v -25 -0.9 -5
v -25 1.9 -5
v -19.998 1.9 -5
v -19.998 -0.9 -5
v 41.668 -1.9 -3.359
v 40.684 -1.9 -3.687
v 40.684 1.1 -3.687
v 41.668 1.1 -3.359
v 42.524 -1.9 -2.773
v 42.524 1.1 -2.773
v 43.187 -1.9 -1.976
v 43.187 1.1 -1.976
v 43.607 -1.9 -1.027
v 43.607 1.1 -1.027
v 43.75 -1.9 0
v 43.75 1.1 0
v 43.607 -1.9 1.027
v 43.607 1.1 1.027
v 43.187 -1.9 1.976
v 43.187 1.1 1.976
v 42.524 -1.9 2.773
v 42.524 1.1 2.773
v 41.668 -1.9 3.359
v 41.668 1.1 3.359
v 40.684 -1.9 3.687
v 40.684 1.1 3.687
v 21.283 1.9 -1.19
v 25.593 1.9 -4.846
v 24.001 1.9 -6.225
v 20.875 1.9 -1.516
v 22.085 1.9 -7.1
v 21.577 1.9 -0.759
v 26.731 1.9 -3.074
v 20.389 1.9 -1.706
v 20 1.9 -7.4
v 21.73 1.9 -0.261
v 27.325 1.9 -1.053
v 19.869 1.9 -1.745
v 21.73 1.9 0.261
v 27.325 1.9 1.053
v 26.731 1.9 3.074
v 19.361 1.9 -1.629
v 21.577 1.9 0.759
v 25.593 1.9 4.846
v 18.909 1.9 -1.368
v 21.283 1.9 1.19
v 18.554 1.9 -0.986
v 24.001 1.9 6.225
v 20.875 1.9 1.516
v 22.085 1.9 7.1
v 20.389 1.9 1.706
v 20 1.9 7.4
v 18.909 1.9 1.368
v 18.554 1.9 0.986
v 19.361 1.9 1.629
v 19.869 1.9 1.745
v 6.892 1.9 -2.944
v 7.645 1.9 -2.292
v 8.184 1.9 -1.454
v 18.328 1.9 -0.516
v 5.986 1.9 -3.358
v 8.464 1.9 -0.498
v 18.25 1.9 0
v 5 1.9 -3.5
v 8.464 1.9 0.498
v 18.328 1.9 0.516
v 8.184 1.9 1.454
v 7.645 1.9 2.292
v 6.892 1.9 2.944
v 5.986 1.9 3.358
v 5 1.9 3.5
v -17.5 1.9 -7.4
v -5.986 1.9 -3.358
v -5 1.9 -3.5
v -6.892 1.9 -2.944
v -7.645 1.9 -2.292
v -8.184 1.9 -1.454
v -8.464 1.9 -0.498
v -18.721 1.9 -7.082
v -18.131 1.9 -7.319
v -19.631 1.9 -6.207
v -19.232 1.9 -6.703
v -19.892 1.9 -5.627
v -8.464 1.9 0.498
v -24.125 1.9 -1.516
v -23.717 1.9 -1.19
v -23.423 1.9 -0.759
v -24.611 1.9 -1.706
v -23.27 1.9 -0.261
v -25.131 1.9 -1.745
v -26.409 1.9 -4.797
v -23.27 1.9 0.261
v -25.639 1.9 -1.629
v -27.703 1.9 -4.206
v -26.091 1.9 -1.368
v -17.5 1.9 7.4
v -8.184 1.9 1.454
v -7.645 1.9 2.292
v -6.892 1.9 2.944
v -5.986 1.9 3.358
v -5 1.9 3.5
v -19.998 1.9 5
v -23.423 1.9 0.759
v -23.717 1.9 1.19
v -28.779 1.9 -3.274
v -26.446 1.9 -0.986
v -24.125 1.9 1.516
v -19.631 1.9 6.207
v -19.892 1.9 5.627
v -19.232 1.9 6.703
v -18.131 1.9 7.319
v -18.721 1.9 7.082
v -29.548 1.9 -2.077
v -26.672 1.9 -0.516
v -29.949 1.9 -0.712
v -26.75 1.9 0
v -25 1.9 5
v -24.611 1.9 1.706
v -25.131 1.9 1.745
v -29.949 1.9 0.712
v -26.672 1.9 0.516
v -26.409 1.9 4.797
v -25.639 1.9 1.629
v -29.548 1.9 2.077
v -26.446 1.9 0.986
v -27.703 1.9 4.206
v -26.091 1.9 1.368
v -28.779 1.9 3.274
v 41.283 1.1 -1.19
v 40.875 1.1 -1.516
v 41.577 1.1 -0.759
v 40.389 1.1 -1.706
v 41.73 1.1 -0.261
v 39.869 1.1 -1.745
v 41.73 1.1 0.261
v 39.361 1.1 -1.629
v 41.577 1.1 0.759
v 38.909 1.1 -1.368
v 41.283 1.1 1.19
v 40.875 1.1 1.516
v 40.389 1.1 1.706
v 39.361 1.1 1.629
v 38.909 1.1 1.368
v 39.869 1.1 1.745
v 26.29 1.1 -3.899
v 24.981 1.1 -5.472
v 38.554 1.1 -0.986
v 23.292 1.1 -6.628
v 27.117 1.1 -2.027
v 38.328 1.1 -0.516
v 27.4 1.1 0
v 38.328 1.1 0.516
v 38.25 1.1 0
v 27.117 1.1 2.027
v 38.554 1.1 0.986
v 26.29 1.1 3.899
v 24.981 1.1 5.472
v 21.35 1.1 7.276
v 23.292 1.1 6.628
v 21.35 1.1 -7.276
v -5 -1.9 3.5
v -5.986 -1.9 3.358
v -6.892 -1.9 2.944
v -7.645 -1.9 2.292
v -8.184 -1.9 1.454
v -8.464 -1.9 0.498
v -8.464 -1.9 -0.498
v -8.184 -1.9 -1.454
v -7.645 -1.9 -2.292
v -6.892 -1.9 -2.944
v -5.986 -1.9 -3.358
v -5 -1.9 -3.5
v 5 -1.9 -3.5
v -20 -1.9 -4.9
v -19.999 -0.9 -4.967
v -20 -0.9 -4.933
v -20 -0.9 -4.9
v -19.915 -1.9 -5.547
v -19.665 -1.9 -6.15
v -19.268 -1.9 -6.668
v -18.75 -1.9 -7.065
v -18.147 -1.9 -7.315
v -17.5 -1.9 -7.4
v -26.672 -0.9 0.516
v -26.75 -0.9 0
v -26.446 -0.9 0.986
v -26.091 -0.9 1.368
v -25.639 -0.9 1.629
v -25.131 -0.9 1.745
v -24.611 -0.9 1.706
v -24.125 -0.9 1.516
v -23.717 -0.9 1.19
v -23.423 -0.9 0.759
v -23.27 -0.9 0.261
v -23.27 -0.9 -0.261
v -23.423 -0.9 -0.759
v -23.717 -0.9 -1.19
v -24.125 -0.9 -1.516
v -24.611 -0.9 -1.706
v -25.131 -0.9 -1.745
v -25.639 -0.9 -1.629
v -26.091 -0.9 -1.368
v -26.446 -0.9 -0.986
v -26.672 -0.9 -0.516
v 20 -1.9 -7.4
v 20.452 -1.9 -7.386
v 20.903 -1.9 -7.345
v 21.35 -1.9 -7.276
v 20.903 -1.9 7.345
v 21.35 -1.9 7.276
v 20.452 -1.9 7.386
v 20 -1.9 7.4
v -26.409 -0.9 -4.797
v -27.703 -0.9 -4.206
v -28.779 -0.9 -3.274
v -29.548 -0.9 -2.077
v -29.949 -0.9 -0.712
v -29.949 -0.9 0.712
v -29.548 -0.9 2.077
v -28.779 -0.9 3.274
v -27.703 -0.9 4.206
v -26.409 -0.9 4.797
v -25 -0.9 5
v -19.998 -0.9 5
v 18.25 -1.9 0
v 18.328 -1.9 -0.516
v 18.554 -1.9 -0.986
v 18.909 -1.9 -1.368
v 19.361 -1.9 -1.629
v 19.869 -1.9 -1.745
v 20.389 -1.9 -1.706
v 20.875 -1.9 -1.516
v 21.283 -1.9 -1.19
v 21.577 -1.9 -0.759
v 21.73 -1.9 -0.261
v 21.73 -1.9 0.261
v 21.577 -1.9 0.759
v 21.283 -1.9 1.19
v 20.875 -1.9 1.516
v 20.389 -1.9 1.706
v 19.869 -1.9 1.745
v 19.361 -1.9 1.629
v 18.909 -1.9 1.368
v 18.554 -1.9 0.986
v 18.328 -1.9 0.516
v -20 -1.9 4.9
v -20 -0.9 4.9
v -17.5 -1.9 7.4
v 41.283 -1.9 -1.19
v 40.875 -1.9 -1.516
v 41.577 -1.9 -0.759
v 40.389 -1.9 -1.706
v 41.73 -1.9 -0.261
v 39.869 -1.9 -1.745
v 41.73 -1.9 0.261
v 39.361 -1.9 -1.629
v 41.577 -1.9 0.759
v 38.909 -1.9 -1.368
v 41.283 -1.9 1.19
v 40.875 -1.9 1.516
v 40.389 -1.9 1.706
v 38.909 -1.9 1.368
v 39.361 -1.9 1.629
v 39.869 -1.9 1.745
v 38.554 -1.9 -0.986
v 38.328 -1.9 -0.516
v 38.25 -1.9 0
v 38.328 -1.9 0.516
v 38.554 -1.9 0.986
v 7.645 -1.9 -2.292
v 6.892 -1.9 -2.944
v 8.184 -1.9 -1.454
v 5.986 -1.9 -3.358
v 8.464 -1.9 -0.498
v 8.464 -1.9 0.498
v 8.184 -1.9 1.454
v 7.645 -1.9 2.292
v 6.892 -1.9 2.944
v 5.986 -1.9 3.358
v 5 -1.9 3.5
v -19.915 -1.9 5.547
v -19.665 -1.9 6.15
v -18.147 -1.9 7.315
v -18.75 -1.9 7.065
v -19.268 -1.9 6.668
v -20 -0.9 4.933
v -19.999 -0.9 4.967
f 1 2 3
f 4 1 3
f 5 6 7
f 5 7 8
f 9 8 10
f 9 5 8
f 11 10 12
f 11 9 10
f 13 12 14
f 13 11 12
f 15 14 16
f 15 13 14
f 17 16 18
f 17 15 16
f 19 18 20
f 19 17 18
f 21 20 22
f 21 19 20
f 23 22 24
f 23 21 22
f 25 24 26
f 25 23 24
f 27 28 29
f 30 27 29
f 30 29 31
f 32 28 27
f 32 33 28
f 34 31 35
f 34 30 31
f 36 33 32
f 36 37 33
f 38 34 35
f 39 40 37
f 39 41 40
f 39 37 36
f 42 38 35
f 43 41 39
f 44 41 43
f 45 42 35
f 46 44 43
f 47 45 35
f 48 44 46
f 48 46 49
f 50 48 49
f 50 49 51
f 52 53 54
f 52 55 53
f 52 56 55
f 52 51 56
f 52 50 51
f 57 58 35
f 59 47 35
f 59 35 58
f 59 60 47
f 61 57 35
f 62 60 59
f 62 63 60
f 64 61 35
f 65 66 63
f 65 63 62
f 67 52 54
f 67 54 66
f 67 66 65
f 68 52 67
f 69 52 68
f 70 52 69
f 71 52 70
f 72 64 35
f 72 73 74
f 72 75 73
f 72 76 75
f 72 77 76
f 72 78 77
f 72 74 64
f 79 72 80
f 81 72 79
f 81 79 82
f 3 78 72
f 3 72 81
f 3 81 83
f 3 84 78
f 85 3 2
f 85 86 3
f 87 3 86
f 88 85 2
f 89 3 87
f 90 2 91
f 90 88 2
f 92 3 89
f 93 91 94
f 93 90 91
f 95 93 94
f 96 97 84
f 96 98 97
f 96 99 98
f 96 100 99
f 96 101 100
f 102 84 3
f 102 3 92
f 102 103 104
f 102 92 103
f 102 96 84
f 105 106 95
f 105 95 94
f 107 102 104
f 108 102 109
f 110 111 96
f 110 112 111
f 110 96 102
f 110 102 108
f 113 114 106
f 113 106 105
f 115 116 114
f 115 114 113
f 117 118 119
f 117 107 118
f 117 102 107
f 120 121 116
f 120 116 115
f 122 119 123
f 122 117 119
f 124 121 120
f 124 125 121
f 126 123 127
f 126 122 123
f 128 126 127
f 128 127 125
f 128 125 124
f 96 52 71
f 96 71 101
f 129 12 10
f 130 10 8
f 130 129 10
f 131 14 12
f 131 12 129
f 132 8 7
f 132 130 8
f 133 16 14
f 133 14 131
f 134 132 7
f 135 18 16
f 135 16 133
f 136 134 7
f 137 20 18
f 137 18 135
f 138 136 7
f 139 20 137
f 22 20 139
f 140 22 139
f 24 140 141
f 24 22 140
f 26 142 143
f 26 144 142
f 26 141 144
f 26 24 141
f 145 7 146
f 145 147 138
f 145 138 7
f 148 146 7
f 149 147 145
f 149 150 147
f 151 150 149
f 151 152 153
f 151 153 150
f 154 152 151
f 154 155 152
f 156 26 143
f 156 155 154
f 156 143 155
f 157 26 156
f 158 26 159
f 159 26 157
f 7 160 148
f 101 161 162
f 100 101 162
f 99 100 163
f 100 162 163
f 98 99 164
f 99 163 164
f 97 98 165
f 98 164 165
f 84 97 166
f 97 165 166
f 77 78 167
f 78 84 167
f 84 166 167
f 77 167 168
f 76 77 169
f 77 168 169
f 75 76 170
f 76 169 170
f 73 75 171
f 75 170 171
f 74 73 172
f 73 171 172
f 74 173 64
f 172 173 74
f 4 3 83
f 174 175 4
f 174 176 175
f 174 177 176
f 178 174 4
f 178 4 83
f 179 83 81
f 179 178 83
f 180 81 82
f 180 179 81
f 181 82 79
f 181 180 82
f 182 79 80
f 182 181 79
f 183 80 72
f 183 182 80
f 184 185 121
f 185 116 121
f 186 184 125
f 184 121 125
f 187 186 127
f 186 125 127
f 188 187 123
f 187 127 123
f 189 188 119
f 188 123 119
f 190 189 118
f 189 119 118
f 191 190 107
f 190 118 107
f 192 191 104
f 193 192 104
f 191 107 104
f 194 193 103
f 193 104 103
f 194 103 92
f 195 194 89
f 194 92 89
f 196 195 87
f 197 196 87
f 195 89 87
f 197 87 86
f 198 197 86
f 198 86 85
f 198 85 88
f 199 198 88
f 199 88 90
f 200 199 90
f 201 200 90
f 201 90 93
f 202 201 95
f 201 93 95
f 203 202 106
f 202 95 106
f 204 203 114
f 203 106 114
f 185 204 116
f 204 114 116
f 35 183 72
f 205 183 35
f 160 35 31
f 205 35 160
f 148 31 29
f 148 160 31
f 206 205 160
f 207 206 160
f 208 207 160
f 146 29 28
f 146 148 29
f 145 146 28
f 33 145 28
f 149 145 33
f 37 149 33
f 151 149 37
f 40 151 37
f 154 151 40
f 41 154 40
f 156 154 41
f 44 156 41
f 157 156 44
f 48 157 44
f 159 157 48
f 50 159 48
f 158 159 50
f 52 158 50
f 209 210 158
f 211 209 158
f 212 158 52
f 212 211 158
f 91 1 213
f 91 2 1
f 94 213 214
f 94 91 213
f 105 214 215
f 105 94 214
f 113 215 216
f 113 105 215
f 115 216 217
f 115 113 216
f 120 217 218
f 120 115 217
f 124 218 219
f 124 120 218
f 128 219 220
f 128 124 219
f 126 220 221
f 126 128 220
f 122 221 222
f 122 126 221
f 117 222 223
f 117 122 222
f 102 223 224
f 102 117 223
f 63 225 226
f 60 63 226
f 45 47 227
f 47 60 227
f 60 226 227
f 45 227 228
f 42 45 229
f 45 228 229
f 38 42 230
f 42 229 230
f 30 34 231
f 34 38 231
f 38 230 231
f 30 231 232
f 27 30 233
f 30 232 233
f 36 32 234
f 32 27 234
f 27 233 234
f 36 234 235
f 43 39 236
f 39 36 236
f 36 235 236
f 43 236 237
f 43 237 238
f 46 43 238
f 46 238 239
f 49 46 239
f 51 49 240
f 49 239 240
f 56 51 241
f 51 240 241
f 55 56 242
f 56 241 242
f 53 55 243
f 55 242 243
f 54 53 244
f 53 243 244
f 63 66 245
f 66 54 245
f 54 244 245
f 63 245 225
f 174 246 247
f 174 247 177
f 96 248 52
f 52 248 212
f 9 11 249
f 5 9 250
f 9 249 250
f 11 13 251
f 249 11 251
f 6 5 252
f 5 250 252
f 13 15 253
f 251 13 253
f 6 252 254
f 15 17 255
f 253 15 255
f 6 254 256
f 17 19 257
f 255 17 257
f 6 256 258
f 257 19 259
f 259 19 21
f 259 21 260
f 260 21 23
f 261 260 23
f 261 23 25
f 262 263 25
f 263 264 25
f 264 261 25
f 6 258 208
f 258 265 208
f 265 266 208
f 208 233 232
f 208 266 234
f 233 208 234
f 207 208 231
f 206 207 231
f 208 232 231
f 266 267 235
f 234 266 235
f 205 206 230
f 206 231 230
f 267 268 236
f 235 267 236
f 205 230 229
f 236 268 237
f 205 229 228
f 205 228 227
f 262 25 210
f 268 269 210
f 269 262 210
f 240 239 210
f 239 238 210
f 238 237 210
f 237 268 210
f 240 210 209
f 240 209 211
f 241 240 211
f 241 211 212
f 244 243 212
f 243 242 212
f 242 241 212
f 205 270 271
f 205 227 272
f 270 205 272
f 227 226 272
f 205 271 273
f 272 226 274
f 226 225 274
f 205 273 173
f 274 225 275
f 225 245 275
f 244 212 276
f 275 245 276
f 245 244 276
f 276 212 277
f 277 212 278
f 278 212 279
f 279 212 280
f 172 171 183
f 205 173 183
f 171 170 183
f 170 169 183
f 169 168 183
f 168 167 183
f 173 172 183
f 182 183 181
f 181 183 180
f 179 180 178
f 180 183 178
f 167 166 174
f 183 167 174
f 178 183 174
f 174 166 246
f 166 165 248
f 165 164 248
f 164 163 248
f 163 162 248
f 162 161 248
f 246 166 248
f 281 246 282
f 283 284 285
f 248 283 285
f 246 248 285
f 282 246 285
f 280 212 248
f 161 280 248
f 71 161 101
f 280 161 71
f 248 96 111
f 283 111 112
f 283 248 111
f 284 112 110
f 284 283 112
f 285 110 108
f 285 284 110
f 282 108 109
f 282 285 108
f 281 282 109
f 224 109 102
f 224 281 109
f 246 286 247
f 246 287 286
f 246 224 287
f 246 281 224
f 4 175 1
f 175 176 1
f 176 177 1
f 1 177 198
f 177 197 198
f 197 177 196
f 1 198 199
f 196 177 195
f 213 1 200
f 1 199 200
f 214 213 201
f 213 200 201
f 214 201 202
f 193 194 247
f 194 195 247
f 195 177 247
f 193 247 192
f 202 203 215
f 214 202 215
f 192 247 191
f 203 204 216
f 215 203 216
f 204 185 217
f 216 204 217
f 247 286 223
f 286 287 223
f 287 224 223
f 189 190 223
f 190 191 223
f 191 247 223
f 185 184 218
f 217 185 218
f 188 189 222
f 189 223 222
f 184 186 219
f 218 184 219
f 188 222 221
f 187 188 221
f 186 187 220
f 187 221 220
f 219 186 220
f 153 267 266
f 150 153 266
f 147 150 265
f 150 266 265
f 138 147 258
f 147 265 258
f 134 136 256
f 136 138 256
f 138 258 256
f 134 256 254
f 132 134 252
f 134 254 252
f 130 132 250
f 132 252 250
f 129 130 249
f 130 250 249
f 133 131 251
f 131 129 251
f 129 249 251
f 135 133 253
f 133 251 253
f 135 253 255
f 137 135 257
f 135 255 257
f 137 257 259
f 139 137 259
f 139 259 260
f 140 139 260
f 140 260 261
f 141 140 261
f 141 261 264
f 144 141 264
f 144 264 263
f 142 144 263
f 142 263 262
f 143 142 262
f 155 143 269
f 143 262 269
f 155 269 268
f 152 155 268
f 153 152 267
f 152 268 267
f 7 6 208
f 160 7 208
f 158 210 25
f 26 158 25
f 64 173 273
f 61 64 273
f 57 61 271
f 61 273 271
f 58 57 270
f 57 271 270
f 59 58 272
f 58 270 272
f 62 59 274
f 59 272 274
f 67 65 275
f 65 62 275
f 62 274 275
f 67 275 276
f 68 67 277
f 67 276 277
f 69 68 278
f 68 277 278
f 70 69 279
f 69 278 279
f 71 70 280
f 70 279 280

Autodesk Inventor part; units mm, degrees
ref_plane "YZ Plane" through (0, 0, 0) normal (1, 0, 0) x (0, 1, 0)
ref_plane "XZ Plane" through (0, 0, 0) normal (0, 1, 0) x (-1, 0, 0)
ref_plane "XY Plane" through (0, 0, 0) normal (0, 0, 1) x (1, 0, 0)
sketch "Sketch1" plane through (0, 0, 0) normal (0, 1, 0) x (-1, 0, 0)
  line L0 (-5, 0) -> (5, 0) construction
  line L1 (-5, -3.5) -> (5, -3.5)
  line L2 (5, 3.5) -> (-5, 3.5)
  arc A0 (-5, 3.5) -> (-5, -3.5) centre (-5, 0) ccw
  arc A1 (5, -3.5) -> (5, 3.5) centre (5, 0) ccw
  circle A2 centre (-20, 0) radius 1.75
  arc A3 (-20, 7.4) -> (-20, -7.4) centre (-20, 0) ccw
  line L3 (17.5, -7.4) -> (-20, -7.4)
  line L4 (17.5, 7.4) -> (-20, 7.4)
  line L5 (20, 4.9) -> (20, -4.9)
  arc A4 (25, -5) -> (25, 5) centre (25, 0) ccw
  circle A5 centre (25, 0) radius 1.75
  line L6 (25, 5) -> (19.998, 5)
  line L7 (25, -5) -> (19.998, -5)
  arc A6 (20, 4.9) -> (17.5, 7.4) centre (17.5, 4.9) ccw
  arc A7 (17.5, -7.4) -> (20, -4.9) centre (17.5, -4.9) ccw
  circle A8 centre (-40, 0) radius 1.75
  circle A9 centre (-40, 0) radius 3.75
  line L8 (-40, 3.75) -> (-21.3747, 7.2712)
  line L9 (-40, -3.75) -> (-21.3747, -7.2712)
  point P0 (0, 0)
  dimension "d3" = 10
  dimension "d4" = 3.5
  dimension "d5" = 3.5
  dimension "d6" = 14.8
  dimension "d10" = 10
  dimension "d11" = 5
  dimension "d12" = 3.5
  dimension "d13" = 2.5
  dimension "d51" = 15
  dimension "d52" = 40
  dimension "d53" = 3.5
  dimension "d54" = 7.5
  dimension "d55" = 20
extrude "Extrusion1" add sketch "Sketch1" along normal mid plane 3.8 contours L4 A6 L5 A7 L3 A3
sketch "Sketch4" plane through (0, 0, 0) normal (0, 1, 0) x (-1, 0, 0)
  line L0 (-5, 0) -> (5, 0) construction
  line L1 (-5, -3.5) -> (5, -3.5)
  line L2 (5, 3.5) -> (-5, 3.5)
  arc A0 (-5, 3.5) -> (-5, -3.5) centre (-5, 0) ccw
  arc A1 (5, -3.5) -> (5, 3.5) centre (5, 0) ccw
  circle A2 centre (-20, 0) radius 1.75
  arc A3 (-20, 7.4) -> (-20, -7.4) centre (-20, 0) ccw
  line L3 (17.5, -7.4) -> (-20, -7.4)
  line L4 (17.5, 7.4) -> (-20, 7.4)
  line L5 (20, 4.9) -> (20, -4.9)
  arc A4 (25, -5) -> (25, 5) centre (25, 0) ccw
  circle A5 centre (25, 0) radius 1.75
  line L6 (25, 5) -> (19.998, 5)
  line L7 (25, -5) -> (19.998, -5)
  arc A6 (20, 4.9) -> (17.5, 7.4) centre (17.5, 4.9) ccw
  arc A7 (17.5, -7.4) -> (20, -4.9) centre (17.5, -4.9) ccw
  circle A8 centre (-40, 0) radius 1.75
  arc A9 (-40.6844, 3.687) -> (-40.6844, -3.687) centre (-40, 0) ccw
  line L8 (-21.3505, 7.2757) -> (-40.6844, 3.687)
  arc A10 (-20, 7.4) -> (-20, -7.4) centre (-20, 0) ccw projected
  line L9 (-48.2908, 0) -> (-20.7624, 0) construction
  line L10 (-40.6844, -3.687) -> (-21.3505, -7.2757)
  point P0 (0, 0)
  point P1 (0, 0)
  dimension "d56" = 10
  dimension "d57" = 3.5
  dimension "d58" = 3.5
  dimension "d59" = 14.8
  dimension "d60" = 10
  dimension "d61" = 5
  dimension "d62" = 3.5
  dimension "d63" = 2.5
  dimension "d64" = 15
  dimension "d65" = 40
  dimension "d66" = 3.5
  dimension "d67" = 7.5
  dimension "d68" = 20
extrude "Extrusion4" add sketch "Sketch4" along normal blind 1.1 and the other way blind 1.9 contours A3 L10 A9 L8
sketch "Sketch5" plane through (0, 0, 0) normal (0, 1, 0) x (-1, 0, 0)
  line L0 (-5, 0) -> (5, 0) construction
  line L1 (-5, -3.5) -> (5, -3.5)
  line L2 (5, 3.5) -> (-5, 3.5)
  arc A0 (-5, 3.5) -> (-5, -3.5) centre (-5, 0) ccw
  arc A1 (5, -3.5) -> (5, 3.5) centre (5, 0) ccw
  circle A2 centre (-20, 0) radius 1.75
  arc A3 (-20, 7.4) -> (-20, -7.4) centre (-20, 0) ccw
  line L3 (17.5, -7.4) -> (-20, -7.4)
  line L4 (17.5, 7.4) -> (-20, 7.4)
  line L5 (20, 4.9) -> (20, -4.9)
  arc A4 (25, -5) -> (25, 5) centre (25, 0) ccw
  circle A5 centre (25, 0) radius 1.75
  line L6 (25, 5) -> (19.998, 5)
  line L7 (25, -5) -> (19.998, -5)
  arc A6 (20, 4.9) -> (17.5, 7.4) centre (17.5, 4.9) ccw
  arc A7 (17.5, -7.4) -> (20, -4.9) centre (17.5, -4.9) ccw
  circle A8 centre (-40, 0) radius 1.75
  circle A9 centre (-40, 0) radius 3.75
  line L8 (-40, 3.75) -> (-21.3747, 7.2712)
  line L9 (-40, -3.75) -> (-21.3747, -7.2712)
  point P0 (0, 0)
  point P1 (0, 0)
  dimension "d73" = 10
  dimension "d74" = 3.5
  dimension "d75" = 3.5
  dimension "d76" = 14.8
  dimension "d77" = 10
  dimension "d78" = 5
  dimension "d79" = 3.5
  dimension "d80" = 2.5
  dimension "d81" = 15
  dimension "d82" = 40
  dimension "d83" = 3.5
  dimension "d84" = 7.5
  dimension "d85" = 20
extrude "Extrusion5" add sketch "Sketch5" along normal blind 1.9 and the other way blind 0.8 contours L6 A4 L7 A7 L5 A6
move faces "Move1" translate (0, -0.1, 0) faces at (-21.0833, -0.8, 0)
